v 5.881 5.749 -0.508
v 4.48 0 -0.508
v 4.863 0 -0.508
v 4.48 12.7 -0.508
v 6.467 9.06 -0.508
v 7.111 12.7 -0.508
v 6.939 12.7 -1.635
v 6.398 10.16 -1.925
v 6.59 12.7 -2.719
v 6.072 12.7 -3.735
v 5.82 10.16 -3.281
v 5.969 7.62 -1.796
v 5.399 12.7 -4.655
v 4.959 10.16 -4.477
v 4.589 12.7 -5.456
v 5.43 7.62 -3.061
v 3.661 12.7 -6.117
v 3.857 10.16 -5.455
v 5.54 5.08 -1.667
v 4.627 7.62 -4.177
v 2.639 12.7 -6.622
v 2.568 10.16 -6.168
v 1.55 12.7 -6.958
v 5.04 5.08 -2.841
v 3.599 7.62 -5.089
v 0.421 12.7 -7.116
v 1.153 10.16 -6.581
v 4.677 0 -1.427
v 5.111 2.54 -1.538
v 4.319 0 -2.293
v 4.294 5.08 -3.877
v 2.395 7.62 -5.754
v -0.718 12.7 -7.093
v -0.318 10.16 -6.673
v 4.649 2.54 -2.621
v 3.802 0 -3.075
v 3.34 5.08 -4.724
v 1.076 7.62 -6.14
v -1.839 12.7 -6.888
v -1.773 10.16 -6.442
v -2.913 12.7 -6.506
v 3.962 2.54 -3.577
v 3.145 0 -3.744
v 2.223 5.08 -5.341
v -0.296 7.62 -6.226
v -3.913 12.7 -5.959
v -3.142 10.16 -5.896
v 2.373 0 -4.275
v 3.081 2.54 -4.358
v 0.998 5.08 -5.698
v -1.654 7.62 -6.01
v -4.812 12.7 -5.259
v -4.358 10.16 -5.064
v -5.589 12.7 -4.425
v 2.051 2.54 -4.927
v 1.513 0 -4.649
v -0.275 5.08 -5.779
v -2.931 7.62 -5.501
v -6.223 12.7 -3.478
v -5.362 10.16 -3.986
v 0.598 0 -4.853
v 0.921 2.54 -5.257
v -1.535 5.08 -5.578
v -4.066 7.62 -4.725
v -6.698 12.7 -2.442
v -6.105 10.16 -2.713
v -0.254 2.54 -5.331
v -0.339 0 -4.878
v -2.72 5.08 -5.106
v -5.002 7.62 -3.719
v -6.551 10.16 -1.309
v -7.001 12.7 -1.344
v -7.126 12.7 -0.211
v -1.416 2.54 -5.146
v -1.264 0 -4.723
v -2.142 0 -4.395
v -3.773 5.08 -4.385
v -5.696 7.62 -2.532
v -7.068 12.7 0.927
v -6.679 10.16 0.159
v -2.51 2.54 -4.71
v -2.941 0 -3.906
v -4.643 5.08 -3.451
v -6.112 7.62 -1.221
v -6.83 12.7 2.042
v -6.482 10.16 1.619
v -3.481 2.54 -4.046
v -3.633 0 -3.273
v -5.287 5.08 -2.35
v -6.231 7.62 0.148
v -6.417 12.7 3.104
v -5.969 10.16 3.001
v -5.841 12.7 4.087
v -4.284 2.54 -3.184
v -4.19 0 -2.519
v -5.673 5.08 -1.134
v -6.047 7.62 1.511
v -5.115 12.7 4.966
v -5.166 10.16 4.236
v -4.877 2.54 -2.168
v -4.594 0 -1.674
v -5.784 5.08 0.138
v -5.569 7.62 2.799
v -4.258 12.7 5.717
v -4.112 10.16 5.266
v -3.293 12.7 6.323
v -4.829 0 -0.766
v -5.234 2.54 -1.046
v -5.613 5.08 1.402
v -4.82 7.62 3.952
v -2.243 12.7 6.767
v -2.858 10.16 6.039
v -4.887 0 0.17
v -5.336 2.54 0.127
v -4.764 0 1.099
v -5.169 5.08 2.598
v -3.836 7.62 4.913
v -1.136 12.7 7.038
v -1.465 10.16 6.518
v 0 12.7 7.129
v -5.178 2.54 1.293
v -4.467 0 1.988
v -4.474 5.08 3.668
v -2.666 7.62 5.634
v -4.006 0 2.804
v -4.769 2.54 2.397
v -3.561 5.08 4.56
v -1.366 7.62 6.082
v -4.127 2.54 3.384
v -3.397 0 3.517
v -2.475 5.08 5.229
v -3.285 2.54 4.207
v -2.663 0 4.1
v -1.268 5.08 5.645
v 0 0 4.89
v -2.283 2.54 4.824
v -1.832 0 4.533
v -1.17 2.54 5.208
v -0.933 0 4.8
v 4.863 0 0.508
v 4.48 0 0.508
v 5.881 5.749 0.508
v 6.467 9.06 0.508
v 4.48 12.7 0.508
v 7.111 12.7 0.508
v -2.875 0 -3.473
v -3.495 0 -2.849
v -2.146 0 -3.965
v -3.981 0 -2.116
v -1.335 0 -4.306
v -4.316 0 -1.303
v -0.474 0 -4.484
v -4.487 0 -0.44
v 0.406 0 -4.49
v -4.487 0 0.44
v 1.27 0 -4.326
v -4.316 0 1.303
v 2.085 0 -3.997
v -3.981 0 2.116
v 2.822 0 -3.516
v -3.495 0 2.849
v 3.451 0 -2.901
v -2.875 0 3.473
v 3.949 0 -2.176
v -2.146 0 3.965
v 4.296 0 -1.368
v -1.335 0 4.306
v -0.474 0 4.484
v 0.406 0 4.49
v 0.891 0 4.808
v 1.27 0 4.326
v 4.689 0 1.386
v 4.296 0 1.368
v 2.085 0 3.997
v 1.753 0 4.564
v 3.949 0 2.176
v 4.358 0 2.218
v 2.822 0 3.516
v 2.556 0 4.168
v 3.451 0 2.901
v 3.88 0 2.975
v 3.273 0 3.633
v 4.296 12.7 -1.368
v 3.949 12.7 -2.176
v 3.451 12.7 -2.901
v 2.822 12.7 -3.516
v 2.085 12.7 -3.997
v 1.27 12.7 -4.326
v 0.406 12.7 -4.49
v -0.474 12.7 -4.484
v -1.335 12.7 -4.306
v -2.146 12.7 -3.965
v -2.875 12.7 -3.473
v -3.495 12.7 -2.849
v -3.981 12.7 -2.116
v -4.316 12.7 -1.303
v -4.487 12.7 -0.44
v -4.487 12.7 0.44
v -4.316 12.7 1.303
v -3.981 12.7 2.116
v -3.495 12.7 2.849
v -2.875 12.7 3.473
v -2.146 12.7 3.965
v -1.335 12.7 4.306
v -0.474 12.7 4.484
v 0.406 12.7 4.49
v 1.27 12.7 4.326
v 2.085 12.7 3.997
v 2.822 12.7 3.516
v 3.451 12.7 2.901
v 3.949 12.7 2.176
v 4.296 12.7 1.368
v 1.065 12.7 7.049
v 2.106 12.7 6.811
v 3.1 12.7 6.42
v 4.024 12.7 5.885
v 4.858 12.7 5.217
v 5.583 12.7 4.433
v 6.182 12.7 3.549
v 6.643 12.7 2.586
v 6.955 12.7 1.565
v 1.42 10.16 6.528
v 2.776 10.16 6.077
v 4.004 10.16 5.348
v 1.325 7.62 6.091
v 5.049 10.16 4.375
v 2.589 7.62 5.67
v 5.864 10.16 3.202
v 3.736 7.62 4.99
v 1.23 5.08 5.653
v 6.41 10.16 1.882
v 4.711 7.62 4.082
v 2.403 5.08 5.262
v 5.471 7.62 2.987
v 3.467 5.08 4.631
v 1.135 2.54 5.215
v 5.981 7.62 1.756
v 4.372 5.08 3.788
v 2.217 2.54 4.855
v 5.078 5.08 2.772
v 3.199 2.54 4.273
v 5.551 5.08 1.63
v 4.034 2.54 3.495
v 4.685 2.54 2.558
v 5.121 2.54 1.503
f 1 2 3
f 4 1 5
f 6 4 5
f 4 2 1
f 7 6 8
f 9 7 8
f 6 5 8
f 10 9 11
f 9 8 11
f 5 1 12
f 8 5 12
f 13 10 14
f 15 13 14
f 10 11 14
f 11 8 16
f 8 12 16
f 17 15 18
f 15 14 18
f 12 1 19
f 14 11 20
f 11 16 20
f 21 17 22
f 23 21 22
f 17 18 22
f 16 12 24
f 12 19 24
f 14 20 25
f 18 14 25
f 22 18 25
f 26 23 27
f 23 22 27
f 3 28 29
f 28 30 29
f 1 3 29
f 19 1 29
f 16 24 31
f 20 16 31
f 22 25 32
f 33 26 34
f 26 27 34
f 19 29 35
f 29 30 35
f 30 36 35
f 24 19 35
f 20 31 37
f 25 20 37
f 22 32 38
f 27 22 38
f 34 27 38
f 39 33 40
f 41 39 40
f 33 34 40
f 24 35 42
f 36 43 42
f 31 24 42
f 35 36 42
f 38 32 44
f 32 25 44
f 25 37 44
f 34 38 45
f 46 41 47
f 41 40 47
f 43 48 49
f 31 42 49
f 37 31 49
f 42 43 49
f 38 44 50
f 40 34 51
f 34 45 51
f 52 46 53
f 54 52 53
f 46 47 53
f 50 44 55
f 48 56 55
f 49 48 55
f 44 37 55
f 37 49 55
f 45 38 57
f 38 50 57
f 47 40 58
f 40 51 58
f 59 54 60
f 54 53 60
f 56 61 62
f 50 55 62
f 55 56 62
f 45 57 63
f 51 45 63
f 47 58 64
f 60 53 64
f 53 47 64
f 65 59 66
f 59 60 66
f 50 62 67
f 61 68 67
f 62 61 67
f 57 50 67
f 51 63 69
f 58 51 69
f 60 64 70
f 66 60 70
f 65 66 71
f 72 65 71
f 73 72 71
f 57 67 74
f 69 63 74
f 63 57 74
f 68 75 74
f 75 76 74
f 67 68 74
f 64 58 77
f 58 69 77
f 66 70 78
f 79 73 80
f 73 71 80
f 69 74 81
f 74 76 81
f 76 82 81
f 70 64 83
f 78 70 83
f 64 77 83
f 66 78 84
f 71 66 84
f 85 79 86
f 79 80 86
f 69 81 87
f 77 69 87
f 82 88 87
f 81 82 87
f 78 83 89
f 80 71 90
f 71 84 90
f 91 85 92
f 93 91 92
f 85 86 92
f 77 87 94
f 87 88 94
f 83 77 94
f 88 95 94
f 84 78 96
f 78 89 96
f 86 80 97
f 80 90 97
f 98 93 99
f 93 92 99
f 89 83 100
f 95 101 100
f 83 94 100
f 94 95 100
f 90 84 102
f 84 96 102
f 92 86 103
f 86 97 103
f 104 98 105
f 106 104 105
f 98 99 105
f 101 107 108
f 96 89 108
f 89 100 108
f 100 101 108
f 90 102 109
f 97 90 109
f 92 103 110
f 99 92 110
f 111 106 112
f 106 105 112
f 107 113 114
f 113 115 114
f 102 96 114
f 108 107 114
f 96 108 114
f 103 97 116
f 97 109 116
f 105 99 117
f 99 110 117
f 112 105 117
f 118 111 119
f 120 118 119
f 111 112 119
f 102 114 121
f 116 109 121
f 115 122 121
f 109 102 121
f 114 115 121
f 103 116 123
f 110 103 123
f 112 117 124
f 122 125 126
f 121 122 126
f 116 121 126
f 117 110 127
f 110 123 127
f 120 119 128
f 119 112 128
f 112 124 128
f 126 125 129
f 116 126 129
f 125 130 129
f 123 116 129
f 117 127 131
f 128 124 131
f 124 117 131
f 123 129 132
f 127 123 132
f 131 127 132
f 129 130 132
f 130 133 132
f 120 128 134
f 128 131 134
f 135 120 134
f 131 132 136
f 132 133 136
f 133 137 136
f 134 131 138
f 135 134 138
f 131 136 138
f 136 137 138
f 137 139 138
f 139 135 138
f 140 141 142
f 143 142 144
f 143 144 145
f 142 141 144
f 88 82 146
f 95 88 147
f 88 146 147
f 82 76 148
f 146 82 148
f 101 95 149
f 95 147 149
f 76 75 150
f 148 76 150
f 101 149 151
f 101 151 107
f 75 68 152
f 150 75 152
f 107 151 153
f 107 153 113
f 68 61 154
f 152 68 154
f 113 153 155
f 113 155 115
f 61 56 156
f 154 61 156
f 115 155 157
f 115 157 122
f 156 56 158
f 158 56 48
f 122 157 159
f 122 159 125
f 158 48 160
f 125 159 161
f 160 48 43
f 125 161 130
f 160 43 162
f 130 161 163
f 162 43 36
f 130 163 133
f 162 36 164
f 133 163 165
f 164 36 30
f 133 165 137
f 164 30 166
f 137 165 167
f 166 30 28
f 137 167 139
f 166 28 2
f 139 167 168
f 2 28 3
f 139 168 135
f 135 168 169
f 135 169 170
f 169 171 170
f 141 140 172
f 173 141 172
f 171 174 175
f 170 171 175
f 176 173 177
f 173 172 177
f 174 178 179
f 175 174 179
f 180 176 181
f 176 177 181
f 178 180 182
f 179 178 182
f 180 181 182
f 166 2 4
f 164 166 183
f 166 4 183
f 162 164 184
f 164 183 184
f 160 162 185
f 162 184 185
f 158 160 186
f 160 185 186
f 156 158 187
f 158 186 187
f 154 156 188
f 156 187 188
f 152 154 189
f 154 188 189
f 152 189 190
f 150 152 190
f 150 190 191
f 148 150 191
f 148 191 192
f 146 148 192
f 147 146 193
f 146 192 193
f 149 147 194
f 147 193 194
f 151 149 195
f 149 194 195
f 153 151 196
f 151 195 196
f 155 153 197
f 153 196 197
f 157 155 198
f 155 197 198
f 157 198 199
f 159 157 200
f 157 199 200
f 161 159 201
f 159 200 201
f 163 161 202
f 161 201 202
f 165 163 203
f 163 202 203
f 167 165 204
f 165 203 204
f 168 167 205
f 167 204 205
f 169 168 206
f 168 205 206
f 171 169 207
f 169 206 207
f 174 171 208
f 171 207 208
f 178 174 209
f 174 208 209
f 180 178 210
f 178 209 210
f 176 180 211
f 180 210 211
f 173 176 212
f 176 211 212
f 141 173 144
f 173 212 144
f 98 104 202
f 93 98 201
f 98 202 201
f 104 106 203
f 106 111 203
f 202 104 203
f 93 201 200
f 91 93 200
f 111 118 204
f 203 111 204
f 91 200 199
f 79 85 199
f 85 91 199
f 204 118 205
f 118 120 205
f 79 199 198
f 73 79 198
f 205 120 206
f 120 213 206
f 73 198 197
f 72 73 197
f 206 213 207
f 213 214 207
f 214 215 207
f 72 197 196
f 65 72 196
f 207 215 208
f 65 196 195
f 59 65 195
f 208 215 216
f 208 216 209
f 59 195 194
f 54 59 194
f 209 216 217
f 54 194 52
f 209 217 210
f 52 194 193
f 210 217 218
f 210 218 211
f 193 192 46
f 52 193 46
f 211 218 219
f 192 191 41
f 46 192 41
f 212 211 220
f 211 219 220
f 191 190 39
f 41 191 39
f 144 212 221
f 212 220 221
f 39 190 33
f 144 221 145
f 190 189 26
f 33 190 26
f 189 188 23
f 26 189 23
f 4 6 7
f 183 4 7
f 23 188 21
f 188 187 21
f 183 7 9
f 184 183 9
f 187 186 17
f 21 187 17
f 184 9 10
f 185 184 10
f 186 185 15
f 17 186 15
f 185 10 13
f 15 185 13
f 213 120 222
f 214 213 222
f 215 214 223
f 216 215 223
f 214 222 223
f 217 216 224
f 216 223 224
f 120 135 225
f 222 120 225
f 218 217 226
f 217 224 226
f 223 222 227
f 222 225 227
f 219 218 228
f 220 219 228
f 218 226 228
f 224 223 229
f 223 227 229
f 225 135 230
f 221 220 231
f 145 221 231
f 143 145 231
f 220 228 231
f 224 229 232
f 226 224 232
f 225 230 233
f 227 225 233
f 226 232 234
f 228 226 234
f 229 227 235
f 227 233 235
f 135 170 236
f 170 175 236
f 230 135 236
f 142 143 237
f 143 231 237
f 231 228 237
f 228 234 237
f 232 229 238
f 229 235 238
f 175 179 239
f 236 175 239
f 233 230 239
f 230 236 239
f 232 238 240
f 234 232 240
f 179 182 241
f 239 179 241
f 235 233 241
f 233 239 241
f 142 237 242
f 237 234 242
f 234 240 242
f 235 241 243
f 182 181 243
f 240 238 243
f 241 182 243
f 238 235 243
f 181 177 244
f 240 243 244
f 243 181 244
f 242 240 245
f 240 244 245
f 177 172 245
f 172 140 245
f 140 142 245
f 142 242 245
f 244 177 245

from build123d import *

# Parameters (mm, degrees)
F3_DEPTH = 0.508


with BuildPart() as f1:
    # F0 (on Right) → F1 (revolve)
    with BuildSketch(Plane.YZ):
        Polygon((12.7, 7.128853), (0, 4.8895), (0, 4.5085), (12.7, 4.5085), align=None)
    revolve(axis=Axis((0, 6.35, 0), (0, 1, 0)))

    # F2 (on Top) → F3 (cut, symmetric)
    with BuildSketch(Plane.XY):
        Polygon((15.353079, 15.146448), (1.846084, 15.401297), (1.846084, 0), (15.353079, 0), align=None)
    extrude(amount=F3_DEPTH, both=True, mode=Mode.SUBTRACT)


solid = f1.part
